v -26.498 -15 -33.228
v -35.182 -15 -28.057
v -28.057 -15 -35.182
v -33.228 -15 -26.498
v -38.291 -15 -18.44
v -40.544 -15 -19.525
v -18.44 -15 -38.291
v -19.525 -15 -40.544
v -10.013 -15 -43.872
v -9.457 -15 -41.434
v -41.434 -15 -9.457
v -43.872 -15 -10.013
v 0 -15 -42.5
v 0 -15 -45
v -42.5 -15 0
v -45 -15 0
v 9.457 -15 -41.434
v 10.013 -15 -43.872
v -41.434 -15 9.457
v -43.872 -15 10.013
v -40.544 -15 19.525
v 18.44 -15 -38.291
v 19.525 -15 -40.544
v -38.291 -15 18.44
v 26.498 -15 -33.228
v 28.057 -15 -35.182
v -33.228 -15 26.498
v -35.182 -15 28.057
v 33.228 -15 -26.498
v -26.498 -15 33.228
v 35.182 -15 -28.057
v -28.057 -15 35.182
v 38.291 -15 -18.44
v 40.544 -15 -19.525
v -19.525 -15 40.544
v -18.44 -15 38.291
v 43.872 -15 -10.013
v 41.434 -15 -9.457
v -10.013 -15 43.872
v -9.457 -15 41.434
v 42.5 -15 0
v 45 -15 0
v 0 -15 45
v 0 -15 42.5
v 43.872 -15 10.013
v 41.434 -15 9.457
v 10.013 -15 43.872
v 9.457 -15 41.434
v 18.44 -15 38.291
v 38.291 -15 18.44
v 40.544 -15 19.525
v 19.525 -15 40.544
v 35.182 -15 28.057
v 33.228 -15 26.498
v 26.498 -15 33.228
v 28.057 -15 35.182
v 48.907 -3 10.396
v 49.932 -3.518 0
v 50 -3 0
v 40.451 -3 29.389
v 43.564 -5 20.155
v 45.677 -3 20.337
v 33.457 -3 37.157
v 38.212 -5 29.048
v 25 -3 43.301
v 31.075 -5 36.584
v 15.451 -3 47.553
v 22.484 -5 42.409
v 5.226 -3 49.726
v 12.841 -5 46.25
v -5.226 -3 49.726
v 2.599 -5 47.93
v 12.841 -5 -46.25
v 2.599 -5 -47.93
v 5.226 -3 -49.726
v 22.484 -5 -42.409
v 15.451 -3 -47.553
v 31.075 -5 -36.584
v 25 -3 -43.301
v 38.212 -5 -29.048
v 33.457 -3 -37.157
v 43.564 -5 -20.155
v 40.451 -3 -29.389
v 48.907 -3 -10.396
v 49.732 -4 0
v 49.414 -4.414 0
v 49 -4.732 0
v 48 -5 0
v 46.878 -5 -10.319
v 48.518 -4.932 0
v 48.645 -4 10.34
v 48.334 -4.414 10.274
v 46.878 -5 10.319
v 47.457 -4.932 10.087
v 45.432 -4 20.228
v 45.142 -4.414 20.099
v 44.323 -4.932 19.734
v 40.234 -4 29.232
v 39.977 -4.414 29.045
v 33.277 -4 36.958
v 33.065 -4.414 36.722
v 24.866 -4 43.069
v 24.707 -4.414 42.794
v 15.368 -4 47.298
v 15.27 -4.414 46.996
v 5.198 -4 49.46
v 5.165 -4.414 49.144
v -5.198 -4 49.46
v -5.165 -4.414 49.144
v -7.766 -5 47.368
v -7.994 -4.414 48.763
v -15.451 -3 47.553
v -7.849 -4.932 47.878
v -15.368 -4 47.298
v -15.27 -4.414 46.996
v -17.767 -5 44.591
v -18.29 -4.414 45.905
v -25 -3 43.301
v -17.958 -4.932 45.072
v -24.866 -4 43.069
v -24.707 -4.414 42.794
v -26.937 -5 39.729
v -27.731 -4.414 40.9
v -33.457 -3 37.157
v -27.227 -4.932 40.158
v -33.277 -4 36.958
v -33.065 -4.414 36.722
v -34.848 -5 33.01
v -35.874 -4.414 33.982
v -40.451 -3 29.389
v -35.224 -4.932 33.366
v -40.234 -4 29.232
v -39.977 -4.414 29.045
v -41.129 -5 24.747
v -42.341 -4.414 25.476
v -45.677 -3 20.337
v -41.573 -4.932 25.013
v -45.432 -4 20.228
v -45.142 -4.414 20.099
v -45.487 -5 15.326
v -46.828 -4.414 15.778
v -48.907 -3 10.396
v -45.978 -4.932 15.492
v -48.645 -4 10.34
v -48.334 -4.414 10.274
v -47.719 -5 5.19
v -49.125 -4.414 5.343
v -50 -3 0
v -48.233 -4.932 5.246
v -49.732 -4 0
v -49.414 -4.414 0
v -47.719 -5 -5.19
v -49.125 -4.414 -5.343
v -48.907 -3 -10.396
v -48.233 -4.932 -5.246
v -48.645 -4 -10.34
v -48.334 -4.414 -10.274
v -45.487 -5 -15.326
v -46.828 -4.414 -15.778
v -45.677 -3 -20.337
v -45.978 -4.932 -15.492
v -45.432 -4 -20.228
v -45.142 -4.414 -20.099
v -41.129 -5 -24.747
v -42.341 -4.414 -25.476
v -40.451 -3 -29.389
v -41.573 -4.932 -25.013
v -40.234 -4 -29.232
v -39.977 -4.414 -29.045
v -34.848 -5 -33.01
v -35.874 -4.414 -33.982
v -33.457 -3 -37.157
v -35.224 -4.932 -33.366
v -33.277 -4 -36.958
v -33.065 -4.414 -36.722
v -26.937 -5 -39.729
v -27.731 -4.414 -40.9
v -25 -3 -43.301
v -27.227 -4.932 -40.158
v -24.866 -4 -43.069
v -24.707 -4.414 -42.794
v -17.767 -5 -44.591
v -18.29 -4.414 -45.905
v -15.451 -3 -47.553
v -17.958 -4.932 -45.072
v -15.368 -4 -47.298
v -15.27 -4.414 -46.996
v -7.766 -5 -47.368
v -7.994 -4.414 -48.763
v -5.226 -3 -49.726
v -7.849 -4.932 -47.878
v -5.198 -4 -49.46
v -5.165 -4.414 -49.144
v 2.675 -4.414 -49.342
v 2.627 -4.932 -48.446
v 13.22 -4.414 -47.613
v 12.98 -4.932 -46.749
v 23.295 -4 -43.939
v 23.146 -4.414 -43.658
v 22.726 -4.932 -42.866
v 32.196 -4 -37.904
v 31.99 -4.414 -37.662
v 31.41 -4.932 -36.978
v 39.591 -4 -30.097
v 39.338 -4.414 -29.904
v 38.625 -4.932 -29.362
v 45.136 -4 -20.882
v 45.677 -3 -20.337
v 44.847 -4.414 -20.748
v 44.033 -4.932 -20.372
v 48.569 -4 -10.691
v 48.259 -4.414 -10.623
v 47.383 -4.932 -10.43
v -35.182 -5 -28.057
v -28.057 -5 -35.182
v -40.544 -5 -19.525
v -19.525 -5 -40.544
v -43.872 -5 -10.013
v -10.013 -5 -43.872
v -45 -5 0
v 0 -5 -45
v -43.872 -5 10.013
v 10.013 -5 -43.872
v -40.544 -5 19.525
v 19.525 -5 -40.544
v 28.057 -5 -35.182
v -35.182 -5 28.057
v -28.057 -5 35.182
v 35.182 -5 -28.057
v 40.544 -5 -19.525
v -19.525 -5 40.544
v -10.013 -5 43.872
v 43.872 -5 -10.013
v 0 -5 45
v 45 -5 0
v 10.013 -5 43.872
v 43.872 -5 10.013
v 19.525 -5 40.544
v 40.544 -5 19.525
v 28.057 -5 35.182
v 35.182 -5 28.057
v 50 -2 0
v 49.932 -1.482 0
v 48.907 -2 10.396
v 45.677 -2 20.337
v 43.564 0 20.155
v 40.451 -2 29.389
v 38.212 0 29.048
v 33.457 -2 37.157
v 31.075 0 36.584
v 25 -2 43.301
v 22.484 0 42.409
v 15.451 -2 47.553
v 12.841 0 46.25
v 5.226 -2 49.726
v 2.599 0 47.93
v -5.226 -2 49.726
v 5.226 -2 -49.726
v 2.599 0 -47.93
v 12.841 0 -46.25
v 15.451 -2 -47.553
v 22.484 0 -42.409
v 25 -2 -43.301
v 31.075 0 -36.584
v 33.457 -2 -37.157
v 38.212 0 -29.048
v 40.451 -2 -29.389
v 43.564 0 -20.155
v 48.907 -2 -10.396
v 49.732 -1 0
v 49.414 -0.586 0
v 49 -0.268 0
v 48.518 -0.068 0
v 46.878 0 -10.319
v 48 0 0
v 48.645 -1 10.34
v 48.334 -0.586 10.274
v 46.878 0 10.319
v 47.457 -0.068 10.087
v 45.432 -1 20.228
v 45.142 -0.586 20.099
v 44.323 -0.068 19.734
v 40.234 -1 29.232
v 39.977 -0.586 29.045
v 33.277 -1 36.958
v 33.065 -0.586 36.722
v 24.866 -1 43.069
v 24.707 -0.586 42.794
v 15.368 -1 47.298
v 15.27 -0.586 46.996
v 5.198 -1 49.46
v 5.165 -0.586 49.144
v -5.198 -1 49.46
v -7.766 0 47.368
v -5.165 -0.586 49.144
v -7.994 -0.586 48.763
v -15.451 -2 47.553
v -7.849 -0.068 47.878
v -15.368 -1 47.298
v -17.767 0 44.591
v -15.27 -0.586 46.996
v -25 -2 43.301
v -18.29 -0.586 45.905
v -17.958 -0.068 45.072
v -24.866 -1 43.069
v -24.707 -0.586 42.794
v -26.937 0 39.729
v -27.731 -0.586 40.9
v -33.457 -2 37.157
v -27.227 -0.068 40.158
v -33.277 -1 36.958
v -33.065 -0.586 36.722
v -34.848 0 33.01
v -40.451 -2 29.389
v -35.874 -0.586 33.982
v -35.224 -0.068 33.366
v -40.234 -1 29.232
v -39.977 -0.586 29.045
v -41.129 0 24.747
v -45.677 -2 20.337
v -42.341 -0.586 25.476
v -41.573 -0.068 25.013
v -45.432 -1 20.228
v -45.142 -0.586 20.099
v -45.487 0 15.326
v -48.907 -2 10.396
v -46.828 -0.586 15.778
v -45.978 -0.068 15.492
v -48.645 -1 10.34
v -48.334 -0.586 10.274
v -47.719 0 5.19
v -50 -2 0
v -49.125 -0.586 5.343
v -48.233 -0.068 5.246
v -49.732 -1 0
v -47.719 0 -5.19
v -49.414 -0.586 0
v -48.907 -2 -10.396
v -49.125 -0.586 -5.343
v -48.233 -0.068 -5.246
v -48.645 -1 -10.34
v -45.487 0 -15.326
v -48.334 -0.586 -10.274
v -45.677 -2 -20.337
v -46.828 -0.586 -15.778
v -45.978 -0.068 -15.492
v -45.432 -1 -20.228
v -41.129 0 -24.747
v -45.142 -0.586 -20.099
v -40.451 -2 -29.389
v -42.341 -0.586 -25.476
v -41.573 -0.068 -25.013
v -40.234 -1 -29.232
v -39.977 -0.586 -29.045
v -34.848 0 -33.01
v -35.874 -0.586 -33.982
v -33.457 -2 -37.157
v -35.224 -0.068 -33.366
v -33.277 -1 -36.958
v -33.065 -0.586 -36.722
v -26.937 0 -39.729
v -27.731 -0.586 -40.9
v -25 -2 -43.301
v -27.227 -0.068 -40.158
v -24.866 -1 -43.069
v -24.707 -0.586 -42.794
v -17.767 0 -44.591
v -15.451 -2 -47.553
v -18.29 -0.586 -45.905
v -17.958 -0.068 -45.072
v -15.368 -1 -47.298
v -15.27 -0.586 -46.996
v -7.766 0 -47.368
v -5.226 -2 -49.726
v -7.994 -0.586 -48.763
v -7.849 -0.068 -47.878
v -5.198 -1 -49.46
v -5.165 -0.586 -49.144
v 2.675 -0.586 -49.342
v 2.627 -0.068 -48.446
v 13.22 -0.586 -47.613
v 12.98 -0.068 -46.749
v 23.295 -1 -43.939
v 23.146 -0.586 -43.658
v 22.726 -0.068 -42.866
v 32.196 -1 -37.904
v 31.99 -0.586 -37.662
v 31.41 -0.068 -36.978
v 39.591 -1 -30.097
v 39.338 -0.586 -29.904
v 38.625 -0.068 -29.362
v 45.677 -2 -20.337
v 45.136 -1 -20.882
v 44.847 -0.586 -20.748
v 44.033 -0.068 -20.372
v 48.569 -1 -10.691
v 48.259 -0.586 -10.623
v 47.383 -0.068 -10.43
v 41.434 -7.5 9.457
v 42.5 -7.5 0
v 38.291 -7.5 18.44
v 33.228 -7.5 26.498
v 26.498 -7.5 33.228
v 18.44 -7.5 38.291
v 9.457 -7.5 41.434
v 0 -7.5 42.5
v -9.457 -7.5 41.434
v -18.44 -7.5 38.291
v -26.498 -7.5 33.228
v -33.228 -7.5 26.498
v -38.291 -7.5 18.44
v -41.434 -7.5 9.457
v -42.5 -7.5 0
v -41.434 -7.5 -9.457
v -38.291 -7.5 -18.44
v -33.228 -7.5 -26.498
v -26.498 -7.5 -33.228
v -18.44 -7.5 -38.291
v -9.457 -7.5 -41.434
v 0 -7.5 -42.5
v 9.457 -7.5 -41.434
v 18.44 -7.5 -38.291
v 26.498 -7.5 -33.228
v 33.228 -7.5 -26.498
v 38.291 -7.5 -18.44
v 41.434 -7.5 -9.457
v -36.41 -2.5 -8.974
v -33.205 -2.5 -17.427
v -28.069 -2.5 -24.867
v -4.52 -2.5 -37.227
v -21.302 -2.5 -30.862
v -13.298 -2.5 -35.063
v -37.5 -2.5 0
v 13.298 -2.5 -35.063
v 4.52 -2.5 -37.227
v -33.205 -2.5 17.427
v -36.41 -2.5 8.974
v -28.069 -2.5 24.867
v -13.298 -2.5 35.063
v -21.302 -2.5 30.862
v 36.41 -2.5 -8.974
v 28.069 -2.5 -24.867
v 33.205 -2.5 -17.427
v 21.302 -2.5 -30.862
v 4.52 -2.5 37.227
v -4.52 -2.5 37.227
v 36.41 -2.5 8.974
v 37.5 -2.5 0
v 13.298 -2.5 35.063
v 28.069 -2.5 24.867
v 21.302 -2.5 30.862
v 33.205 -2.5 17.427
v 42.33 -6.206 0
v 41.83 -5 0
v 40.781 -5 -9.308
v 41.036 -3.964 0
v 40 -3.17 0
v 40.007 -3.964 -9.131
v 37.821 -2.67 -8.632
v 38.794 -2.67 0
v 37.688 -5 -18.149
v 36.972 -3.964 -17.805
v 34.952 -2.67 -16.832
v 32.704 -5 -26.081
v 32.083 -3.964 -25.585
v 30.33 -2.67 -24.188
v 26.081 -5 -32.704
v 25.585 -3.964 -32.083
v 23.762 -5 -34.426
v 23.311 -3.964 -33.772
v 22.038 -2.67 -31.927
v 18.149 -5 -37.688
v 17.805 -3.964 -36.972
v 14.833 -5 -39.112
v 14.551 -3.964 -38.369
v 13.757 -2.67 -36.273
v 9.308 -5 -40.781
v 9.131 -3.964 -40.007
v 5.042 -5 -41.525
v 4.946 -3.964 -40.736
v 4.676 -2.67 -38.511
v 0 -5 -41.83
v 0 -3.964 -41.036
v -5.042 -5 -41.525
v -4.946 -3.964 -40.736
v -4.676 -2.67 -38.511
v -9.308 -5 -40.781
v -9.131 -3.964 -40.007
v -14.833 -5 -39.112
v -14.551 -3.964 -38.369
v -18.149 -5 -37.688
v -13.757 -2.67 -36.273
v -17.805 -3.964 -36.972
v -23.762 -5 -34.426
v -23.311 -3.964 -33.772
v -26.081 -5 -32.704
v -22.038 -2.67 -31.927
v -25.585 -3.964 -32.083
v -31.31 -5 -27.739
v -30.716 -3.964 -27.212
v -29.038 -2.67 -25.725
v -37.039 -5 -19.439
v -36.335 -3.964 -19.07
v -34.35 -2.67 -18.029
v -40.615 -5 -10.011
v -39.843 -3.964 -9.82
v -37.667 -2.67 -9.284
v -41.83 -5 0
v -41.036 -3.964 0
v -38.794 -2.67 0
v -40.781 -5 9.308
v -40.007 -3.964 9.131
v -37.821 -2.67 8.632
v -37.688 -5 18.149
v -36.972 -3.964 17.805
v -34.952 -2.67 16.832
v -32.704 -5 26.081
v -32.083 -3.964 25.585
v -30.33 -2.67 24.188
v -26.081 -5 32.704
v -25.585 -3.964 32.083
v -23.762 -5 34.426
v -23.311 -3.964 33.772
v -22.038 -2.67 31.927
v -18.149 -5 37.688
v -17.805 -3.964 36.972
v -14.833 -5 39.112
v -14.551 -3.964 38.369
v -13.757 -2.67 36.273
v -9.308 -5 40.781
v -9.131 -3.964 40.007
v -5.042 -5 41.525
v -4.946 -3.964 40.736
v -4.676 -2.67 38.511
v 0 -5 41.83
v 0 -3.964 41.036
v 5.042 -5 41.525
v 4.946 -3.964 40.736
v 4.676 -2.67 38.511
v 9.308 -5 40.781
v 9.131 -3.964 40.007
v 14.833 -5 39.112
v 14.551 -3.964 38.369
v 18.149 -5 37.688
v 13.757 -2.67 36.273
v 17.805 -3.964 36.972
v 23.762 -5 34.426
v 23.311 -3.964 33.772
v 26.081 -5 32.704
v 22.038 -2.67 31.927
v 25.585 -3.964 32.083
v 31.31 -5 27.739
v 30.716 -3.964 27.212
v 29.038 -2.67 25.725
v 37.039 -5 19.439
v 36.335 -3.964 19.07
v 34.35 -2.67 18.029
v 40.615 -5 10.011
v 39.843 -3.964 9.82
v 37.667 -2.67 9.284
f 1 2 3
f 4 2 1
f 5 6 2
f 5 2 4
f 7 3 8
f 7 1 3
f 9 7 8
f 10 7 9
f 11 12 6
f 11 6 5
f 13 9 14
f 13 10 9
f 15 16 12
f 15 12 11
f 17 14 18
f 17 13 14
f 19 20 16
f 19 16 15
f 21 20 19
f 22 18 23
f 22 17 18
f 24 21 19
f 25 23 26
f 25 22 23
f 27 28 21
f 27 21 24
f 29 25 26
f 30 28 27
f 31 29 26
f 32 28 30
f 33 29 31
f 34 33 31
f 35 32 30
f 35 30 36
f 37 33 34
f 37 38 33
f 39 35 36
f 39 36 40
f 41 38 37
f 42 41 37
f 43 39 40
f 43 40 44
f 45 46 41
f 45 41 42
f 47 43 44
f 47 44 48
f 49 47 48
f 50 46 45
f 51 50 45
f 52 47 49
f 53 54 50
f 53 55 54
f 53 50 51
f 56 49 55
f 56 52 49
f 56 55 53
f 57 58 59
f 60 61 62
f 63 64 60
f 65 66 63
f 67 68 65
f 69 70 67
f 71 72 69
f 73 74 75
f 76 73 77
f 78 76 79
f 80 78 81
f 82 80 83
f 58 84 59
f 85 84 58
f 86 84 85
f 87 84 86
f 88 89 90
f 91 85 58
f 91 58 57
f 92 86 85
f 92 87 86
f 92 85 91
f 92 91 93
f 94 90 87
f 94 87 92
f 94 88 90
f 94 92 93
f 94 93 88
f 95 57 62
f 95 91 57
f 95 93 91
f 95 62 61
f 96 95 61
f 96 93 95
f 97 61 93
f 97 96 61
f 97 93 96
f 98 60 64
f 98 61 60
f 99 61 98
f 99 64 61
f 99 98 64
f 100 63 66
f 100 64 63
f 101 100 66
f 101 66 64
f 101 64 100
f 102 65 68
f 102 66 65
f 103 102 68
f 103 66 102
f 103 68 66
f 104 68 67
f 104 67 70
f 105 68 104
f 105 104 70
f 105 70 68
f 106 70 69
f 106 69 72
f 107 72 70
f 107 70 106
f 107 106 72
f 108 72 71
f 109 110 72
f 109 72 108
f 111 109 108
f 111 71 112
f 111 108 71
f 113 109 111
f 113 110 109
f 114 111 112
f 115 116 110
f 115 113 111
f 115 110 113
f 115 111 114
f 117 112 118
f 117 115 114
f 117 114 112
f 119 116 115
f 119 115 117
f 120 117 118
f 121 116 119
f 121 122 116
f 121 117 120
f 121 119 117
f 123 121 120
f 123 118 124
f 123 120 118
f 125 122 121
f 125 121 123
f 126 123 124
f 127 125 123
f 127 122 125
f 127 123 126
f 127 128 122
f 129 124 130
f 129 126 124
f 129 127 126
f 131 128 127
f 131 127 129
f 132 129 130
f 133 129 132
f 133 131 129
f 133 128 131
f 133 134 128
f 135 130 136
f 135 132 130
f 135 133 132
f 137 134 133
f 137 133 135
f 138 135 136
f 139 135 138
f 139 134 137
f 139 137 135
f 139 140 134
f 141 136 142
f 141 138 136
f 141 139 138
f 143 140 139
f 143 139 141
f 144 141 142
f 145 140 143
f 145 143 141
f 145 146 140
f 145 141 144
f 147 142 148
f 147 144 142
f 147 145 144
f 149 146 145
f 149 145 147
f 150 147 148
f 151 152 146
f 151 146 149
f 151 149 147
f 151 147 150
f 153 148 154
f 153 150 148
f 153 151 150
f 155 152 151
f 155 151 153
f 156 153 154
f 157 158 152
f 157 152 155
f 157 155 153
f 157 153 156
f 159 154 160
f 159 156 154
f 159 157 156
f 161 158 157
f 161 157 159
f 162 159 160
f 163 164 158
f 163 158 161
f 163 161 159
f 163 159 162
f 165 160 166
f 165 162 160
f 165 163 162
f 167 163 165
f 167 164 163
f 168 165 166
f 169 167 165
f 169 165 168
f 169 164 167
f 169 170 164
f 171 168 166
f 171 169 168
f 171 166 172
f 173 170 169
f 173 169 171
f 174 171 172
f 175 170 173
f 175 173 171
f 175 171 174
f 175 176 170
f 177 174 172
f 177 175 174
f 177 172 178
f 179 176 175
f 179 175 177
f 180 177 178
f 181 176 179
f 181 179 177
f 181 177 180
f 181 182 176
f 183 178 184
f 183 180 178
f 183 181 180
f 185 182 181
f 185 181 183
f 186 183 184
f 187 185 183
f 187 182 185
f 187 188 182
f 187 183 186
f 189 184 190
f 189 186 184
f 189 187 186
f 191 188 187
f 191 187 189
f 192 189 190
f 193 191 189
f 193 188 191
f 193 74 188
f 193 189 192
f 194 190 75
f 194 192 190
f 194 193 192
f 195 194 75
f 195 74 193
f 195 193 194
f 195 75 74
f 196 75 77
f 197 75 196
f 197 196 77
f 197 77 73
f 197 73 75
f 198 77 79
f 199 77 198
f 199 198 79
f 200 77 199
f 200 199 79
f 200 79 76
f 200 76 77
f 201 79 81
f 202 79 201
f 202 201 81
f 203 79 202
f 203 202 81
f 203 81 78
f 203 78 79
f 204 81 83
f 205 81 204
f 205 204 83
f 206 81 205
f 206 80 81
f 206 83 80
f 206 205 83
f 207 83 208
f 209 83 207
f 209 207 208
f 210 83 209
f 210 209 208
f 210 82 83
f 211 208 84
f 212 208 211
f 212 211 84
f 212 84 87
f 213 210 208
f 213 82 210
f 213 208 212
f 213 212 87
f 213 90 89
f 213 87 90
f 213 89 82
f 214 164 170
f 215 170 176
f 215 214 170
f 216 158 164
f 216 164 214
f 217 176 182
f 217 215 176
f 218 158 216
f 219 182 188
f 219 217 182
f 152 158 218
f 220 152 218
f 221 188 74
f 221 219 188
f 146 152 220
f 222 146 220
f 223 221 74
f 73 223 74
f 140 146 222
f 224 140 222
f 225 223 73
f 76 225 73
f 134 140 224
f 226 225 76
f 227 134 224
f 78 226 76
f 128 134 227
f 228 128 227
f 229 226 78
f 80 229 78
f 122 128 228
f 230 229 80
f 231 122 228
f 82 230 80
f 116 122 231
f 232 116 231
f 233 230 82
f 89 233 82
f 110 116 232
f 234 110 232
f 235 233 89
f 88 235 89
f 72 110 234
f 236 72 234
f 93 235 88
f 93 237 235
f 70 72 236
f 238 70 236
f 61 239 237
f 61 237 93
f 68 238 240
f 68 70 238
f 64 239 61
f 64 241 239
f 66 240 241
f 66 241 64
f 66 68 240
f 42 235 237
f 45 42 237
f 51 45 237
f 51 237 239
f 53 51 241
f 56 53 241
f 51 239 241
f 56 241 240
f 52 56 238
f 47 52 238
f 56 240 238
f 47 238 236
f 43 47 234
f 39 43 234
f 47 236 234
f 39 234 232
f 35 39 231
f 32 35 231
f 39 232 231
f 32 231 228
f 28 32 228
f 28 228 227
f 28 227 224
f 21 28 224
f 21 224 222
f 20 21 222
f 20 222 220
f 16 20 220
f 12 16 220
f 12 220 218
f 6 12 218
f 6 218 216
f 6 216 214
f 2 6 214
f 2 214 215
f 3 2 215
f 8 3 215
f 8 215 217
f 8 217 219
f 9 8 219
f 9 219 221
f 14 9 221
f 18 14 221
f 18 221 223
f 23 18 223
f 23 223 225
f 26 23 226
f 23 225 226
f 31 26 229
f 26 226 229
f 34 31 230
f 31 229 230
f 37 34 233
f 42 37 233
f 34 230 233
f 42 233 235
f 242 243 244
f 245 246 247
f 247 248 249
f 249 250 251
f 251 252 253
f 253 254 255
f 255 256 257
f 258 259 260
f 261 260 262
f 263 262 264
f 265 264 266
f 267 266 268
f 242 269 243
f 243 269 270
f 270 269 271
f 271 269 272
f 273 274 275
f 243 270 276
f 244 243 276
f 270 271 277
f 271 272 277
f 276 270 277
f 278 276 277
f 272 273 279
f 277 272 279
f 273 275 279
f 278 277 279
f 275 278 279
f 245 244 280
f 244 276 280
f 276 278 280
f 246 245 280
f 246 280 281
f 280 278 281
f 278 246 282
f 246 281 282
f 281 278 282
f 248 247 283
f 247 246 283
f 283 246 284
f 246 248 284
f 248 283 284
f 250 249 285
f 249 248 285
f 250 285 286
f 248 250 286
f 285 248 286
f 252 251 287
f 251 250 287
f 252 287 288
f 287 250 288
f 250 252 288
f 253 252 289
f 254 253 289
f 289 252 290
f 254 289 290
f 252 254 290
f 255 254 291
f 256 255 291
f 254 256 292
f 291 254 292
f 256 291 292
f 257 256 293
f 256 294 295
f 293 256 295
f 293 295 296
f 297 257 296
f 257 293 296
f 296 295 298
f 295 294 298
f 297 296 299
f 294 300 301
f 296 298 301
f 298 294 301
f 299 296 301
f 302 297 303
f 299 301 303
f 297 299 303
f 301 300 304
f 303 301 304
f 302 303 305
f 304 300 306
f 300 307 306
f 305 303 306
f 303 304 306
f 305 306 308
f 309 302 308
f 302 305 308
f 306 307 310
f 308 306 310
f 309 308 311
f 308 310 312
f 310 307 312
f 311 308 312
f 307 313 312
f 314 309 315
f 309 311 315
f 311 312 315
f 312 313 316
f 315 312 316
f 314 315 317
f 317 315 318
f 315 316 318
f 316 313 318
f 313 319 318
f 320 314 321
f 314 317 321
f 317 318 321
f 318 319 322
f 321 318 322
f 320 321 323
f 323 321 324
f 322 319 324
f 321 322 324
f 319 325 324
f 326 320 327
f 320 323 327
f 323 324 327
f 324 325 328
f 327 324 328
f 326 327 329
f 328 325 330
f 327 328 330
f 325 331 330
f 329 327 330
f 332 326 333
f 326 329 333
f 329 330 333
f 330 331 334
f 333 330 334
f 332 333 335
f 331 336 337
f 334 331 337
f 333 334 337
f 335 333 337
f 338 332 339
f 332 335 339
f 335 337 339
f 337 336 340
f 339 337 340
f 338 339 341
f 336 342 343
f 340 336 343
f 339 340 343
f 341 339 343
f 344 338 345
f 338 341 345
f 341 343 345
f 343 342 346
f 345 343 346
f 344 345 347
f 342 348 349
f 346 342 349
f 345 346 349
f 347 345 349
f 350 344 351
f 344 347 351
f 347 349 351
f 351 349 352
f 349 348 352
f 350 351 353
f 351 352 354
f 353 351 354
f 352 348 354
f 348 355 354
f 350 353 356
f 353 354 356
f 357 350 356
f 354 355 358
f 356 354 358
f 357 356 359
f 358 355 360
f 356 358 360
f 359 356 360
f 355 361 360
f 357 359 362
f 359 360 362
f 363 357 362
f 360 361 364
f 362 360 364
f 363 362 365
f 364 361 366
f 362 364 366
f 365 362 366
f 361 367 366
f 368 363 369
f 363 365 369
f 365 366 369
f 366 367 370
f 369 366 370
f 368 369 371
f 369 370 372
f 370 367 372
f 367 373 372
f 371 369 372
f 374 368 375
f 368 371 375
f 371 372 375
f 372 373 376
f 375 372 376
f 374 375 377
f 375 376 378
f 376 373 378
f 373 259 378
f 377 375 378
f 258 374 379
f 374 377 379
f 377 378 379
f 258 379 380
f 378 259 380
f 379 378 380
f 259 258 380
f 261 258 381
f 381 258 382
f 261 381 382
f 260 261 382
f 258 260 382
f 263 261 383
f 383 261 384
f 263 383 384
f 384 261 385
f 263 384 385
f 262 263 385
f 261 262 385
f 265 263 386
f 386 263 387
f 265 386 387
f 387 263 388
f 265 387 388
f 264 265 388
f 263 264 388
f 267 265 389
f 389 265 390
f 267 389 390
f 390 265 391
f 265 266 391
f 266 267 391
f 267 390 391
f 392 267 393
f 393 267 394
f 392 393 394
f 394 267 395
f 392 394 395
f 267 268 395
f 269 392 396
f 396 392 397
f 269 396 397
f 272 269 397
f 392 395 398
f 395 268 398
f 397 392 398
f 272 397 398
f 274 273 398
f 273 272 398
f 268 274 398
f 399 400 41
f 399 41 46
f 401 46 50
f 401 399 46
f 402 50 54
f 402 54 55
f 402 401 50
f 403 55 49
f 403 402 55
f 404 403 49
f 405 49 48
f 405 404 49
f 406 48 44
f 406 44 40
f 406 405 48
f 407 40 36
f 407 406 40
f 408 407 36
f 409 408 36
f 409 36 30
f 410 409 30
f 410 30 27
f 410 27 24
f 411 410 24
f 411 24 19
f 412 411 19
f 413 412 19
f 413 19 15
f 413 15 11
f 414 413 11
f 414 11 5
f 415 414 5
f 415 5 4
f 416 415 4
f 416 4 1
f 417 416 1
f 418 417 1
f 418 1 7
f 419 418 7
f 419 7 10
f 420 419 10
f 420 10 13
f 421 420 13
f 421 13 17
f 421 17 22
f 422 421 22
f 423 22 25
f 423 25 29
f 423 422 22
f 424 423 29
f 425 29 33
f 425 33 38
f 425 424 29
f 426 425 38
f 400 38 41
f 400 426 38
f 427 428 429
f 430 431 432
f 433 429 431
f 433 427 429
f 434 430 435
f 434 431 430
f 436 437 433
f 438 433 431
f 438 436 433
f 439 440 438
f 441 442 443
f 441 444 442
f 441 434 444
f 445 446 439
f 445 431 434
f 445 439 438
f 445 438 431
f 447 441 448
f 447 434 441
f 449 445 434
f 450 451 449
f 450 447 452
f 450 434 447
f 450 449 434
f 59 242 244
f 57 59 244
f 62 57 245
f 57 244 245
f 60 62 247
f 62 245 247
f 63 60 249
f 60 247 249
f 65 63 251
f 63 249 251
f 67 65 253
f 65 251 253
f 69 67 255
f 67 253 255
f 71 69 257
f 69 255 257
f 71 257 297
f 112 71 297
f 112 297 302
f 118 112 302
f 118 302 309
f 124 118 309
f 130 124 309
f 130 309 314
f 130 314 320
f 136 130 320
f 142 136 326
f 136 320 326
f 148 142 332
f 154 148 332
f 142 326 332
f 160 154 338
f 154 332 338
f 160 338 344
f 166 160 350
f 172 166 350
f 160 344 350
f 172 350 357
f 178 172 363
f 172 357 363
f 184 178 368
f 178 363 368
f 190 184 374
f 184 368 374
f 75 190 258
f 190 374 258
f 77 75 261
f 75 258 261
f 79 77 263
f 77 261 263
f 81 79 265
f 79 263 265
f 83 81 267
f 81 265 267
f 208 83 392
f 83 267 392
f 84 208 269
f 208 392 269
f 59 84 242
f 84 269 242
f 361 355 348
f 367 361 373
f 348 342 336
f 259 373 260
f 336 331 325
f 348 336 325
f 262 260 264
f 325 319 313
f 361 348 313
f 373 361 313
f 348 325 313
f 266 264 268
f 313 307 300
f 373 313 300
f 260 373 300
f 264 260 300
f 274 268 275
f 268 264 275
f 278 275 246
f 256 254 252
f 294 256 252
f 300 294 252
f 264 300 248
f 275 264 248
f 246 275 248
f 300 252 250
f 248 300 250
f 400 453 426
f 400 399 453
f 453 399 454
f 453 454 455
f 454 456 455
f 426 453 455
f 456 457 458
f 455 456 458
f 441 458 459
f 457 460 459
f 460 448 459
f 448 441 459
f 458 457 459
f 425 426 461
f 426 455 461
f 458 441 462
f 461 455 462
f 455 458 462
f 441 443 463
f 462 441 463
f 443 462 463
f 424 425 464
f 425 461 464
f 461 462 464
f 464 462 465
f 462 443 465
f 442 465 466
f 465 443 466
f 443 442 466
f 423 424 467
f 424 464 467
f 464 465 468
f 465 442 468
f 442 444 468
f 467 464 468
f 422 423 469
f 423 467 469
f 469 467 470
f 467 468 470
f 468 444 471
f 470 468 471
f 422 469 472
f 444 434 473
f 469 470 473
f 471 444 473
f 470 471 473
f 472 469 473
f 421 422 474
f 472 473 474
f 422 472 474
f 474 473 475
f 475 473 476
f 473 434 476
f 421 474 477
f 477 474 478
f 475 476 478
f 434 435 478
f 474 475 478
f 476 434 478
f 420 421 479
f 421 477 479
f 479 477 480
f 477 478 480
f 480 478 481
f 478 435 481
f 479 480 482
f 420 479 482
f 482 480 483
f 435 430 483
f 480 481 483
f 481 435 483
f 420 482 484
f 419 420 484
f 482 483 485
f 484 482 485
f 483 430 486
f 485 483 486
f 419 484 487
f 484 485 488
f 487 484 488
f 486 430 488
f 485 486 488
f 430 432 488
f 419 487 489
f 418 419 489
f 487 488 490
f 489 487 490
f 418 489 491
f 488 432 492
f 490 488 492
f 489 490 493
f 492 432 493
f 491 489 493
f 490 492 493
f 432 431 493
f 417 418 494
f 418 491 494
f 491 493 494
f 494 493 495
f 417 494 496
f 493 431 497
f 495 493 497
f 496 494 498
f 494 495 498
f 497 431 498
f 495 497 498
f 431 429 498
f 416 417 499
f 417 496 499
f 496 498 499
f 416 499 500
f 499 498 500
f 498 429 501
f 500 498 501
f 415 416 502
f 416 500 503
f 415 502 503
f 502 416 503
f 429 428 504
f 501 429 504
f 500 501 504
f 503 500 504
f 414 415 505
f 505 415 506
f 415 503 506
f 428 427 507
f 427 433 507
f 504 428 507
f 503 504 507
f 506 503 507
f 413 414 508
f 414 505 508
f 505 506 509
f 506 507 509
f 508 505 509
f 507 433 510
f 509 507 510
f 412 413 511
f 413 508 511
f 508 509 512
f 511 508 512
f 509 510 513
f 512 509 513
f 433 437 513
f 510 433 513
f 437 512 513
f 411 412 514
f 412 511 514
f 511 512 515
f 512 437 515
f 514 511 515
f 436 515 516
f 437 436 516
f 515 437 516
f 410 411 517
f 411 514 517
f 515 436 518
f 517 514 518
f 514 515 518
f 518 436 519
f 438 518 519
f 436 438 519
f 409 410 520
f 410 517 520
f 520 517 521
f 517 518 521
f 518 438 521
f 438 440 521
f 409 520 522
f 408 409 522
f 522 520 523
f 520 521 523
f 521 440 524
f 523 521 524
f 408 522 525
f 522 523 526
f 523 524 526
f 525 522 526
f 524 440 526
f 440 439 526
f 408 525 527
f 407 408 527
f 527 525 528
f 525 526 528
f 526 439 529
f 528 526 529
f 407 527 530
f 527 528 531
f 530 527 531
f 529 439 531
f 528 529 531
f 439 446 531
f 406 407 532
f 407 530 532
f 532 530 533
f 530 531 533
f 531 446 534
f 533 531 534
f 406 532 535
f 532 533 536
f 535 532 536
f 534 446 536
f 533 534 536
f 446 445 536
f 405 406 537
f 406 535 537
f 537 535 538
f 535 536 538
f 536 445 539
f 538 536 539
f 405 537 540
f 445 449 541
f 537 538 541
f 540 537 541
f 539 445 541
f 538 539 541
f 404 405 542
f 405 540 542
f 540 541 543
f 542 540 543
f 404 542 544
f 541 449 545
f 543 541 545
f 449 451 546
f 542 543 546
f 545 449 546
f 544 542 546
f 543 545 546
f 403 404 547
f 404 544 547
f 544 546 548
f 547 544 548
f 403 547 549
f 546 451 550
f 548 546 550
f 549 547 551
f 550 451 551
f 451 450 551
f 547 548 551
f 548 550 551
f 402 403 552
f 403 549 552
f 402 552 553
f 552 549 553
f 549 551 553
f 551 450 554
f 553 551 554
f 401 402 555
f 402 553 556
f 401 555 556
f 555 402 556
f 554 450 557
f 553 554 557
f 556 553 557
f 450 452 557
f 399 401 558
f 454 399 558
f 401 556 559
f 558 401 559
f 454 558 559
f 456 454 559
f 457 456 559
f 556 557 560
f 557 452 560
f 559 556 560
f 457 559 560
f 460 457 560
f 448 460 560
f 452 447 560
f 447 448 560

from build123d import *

# Parameters (mm, degrees)
F0_R     = 50
F1_DEPTH = 5
F3_R     = 2
F2_R     = 45
F4_DEPTH = 15
F5_T     = 2.5
F6_R     = 5


# Not quite as in the source:
# - a shell that OpenCascade refuses in one call is made with other operations: the cavity is built on its own and cut out


with BuildPart() as f1:
    # F0 (on Front) → F1 (new body)
    with BuildSketch(Plane.XZ):
        Circle(F0_R)
    extrude(amount=F1_DEPTH)

    # F3
    f3_edges = [f1.edges().sort_by_distance(p)[0] for p in [
        (-50, -5, 0),
        (-50, 0, 0),
    ]]
    fillet(f3_edges, radius=F3_R)

    # F2 (on Front) → F4 (join)
    with BuildSketch(Plane.XZ):
        Circle(F2_R)
    extrude(amount=F4_DEPTH)

    # F5: shell of thickness 2.5, made by hand


with BuildPart() as f5_core1:
    # F5_t2: copy of F1
    add(f1.part)

    # the walls: a layer under each face that stays
    f5_faces = [f5_core1.faces().sort_by_distance(p)[0] for p in [
        (-50, -2.5, 0),
        (0, 0, 0),
        (-32, -5, -32),
        (-45, -10, 0),
    ]]
    thicken(f5_faces, amount=-F5_T, mode=Mode.SUBTRACT)

    # F5_s3 → F5_t4 (revolve, cut)
    with BuildSketch(Plane.XY):
        Polygon((45.025, -5.025), (45, -2.5), (42.5, -2.5), (42.5, -5), align=None)
    revolve(axis=Axis((0, -5, 0), (0, 1, 0)), mode=Mode.SUBTRACT)


with BuildPart() as f1_1:
    add(f1.part)

    # what is left inside the walls is the cavity
    f5_cavity = [f5_core1.part.solids().sort_by_distance(p)[0] for p in [
        (0, -2.525, -14.166667),
    ]]
    add(f5_cavity, mode=Mode.SUBTRACT)

    # F6
    f6_edges = [f1_1.edges().sort_by_distance(p)[0] for p in [
        (42.5, -8.75, 0),
        (-42.5, -2.5, 0),
    ]]
    fillet(f6_edges, radius=F6_R)


solid = f1_1.part
